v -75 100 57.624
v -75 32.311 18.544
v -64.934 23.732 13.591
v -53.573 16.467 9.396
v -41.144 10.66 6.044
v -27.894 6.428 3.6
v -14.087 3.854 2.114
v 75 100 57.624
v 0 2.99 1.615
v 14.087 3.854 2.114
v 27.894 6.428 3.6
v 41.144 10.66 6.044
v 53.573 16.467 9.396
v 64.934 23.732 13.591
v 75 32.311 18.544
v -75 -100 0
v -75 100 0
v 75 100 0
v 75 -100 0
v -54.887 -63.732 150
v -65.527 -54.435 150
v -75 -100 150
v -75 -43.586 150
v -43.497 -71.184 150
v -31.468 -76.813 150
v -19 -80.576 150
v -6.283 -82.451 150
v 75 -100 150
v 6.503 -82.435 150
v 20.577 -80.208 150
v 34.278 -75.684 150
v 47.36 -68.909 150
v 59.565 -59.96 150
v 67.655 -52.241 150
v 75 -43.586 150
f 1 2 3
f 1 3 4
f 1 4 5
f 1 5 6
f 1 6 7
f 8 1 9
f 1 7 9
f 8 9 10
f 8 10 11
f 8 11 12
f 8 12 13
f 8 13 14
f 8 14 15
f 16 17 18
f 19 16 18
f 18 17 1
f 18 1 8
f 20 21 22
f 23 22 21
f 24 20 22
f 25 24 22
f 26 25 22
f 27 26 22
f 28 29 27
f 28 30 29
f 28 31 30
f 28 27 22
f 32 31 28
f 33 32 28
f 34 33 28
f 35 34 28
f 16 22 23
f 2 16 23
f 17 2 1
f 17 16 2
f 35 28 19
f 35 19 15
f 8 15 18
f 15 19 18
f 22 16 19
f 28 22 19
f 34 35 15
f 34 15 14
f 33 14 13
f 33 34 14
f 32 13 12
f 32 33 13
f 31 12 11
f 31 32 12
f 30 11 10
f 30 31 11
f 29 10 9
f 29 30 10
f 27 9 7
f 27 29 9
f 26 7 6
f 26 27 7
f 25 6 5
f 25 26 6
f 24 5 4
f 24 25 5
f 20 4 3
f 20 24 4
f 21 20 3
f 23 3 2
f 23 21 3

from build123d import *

# Parameters (mm, degrees)
F0_W     = 150
F0_H     = 200
F1_DEPTH = 150
F4_R     = 100
F5_DEPTH = 180


with BuildPart() as f1:
    # F0 (on Top) → F1 (new body)
    with BuildSketch(Plane.XY):
        Rectangle(F0_W, F0_H)
    extrude(amount=F1_DEPTH)

    # F4 (on face) → F5 (cut)
    with BuildSketch(Plane(origin=(0, -89.9519052838, 155.8012701892), x_dir=(1, 0, 0), z_dir=(0, 0.5, -0.8660254038))):
        with Locations((0, -103.3974596216)):
            Circle(F4_R)
    extrude(amount=F5_DEPTH, mode=Mode.SUBTRACT)


solid = f1.part
